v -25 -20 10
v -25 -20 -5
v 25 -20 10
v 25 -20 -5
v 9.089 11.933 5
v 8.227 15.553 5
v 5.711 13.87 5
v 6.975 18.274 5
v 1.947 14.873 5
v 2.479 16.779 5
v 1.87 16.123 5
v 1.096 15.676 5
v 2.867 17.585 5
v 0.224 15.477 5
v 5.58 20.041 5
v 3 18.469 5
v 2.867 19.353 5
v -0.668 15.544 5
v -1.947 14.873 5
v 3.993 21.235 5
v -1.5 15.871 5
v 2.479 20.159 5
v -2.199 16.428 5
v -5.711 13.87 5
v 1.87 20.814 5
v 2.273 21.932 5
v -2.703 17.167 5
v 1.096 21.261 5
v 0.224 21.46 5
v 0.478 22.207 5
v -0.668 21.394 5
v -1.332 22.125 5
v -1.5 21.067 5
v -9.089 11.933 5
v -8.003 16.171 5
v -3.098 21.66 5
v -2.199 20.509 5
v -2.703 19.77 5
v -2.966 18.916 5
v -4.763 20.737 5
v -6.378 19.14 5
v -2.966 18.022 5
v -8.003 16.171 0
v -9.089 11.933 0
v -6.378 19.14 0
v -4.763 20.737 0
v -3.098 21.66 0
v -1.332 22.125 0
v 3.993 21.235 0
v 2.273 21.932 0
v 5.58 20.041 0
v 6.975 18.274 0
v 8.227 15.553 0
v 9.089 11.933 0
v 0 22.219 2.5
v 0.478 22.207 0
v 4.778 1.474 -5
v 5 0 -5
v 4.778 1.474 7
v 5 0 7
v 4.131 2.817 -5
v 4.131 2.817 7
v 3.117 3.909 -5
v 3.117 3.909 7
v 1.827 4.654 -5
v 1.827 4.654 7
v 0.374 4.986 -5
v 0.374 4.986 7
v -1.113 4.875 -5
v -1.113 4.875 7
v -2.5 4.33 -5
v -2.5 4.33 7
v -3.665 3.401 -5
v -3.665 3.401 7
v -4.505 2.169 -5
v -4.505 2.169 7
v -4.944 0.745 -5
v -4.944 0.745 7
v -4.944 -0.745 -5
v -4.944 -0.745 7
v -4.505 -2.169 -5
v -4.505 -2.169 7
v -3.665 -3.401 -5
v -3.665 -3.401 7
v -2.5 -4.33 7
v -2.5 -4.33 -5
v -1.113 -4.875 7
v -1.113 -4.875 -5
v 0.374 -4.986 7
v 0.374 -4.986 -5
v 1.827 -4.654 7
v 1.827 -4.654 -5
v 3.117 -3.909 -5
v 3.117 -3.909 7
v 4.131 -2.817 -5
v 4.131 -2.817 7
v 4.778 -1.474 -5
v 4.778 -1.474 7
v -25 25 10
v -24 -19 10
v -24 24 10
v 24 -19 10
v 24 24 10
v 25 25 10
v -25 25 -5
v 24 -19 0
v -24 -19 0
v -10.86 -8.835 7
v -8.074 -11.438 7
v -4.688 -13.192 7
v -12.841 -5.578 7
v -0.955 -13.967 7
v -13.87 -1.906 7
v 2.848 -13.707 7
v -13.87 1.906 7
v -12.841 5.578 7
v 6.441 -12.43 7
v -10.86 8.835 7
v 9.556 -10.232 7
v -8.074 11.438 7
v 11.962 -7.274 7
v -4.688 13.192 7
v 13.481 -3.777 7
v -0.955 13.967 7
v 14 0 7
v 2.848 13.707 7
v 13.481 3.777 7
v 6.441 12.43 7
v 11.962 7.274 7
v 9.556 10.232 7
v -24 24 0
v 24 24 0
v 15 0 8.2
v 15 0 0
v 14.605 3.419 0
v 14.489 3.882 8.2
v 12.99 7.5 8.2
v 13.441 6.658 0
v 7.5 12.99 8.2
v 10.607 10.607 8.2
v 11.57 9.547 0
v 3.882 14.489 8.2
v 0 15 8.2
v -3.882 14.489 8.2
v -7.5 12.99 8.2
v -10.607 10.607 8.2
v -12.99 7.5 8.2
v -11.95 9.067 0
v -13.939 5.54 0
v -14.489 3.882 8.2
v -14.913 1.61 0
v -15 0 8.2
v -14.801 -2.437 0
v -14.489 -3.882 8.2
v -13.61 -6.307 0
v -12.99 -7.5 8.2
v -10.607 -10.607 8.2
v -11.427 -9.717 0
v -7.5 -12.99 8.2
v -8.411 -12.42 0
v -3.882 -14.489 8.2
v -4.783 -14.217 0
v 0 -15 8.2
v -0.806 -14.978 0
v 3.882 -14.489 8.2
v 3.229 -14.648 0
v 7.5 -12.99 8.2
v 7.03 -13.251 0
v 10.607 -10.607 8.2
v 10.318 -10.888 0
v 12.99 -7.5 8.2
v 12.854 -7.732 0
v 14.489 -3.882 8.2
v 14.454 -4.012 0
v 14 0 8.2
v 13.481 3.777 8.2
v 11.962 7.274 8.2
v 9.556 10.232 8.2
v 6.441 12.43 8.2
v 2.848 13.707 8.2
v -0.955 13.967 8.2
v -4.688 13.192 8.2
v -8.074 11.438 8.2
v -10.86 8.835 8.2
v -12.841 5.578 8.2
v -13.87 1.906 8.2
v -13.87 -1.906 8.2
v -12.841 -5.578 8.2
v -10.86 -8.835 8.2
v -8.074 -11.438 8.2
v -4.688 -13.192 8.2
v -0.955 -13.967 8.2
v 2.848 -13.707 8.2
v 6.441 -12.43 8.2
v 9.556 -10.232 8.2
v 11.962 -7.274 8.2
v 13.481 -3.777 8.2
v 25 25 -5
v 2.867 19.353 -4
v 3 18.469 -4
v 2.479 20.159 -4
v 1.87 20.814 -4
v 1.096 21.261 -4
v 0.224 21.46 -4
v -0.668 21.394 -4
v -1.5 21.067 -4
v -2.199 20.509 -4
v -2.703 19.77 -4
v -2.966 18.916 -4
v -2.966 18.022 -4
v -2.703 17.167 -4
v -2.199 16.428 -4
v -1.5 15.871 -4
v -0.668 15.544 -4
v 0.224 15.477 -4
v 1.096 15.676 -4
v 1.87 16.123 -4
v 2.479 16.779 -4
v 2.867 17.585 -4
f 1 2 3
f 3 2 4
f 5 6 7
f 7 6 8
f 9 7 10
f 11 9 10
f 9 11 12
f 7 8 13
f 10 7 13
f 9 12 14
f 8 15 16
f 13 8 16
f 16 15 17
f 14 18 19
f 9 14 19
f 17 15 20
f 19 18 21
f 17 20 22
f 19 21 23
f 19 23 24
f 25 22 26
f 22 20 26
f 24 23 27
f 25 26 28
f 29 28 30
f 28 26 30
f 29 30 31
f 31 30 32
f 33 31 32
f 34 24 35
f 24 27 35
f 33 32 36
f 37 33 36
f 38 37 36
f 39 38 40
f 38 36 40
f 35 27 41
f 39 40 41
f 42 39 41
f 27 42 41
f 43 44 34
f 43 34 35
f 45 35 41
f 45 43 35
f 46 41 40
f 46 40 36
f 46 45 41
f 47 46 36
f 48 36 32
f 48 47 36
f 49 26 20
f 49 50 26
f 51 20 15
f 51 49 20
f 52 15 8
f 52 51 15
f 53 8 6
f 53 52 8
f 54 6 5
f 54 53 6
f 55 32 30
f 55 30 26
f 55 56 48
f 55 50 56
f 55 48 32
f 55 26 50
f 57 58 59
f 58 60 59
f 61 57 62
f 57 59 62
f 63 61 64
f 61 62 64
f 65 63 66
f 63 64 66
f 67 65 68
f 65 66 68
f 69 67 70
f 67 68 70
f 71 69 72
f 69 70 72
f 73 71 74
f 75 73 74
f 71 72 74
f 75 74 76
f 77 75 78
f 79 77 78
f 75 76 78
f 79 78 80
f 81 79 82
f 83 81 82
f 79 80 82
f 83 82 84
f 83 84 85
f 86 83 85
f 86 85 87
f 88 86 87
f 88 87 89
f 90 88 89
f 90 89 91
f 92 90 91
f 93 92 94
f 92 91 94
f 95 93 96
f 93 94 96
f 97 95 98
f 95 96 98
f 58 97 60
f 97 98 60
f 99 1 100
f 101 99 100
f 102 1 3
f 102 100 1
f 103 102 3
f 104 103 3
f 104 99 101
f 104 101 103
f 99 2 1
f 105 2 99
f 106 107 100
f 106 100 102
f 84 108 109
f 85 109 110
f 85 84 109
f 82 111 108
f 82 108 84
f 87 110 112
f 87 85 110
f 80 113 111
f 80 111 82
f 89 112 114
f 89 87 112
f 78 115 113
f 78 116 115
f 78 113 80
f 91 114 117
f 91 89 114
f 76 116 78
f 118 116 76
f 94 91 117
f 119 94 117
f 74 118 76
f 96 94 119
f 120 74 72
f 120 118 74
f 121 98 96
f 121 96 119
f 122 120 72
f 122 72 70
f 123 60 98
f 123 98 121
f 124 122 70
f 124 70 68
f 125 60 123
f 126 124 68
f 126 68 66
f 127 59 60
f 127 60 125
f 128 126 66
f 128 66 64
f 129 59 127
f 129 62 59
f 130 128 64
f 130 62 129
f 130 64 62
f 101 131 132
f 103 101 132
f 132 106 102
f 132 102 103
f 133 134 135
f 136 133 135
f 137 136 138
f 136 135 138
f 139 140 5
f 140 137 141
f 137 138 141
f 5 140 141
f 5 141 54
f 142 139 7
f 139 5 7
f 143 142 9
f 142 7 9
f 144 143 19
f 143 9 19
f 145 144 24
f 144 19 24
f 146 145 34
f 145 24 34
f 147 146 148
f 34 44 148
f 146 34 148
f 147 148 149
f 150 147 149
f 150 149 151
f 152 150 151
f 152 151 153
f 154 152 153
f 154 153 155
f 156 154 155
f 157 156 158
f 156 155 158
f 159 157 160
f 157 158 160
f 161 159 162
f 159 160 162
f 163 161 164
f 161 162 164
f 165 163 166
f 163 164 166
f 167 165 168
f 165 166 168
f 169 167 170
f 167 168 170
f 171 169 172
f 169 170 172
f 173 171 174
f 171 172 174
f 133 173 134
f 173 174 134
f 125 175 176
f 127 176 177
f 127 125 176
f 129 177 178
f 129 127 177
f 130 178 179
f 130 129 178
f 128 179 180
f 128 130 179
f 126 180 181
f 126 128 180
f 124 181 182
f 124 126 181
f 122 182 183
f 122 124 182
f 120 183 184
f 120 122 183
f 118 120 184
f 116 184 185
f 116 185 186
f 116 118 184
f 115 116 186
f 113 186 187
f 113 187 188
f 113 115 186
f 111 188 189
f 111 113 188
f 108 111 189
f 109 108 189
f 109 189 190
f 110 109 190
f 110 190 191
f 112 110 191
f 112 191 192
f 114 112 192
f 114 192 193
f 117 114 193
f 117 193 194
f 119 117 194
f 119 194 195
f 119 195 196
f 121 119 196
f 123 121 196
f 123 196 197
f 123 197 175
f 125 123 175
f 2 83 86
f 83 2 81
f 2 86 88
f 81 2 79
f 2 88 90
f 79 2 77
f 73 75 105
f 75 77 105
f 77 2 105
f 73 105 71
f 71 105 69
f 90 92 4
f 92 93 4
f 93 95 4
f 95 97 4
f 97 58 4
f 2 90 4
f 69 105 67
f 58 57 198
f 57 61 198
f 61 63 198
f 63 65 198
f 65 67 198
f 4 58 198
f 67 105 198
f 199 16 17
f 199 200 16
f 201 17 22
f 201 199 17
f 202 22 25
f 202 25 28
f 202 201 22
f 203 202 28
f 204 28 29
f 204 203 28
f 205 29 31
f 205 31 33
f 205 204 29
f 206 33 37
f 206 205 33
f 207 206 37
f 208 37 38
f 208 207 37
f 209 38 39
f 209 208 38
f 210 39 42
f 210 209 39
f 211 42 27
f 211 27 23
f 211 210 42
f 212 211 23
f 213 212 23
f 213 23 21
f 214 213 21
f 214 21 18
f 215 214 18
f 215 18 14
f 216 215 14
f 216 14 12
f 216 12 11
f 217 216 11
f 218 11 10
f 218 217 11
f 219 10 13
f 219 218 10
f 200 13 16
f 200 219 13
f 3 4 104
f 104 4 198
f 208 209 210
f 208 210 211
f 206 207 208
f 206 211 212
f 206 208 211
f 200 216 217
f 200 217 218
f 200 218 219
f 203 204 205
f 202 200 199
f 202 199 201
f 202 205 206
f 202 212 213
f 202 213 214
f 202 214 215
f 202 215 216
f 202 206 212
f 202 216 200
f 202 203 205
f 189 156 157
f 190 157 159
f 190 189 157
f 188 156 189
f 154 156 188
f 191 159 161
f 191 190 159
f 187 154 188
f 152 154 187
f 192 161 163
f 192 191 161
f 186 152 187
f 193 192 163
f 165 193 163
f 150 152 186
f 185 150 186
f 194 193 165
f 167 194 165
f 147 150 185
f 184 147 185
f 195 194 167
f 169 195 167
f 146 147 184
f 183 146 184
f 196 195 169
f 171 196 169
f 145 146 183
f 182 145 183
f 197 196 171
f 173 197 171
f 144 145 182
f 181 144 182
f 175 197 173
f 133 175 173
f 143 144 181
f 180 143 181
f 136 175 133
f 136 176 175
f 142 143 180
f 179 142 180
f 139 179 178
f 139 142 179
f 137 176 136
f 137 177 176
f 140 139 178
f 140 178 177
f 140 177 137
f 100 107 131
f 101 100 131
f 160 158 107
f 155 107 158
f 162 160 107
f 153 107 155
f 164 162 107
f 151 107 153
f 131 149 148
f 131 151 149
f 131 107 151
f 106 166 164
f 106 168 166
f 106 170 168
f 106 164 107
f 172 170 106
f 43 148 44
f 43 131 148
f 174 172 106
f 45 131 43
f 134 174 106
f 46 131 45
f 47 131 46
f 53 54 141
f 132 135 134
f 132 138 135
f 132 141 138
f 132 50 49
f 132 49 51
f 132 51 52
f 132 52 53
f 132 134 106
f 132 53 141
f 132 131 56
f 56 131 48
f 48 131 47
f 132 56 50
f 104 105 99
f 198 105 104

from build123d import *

# Parameters (mm, degrees)
SKETCH_R          = 15
PAD_DEPTH         = 7
SKETCH001_R       = 3
PAD001_DEPTH      = 5
SKETCH002_R       = 15
SKETCH002_R_2     = 14
PAD002_DEPTH      = 8.2
SKETCH003_W       = 50
SKETCH003_H       = 45
PAD003_DEPTH      = 5
SKETCH004_W       = 50
SKETCH004_H       = 45
SKETCH004_W_2     = 48
SKETCH004_H_2     = 43
PAD004_DEPTH      = 10
SKETCH005_R       = 5
POCKET_DEPTH      = 5.001
POCKET_DEPTH_BACK = -10.001
SKETCH006_R       = 3
POCKET001_DEPTH   = 4


with BuildPart() as part:
    # Sketch → Pad (new body)
    with BuildSketch(Plane.XY):
        Circle(SKETCH_R)
    extrude(amount=PAD_DEPTH)

    # Sketch001 → Pad001 (join)
    with BuildSketch(Plane.XY):
        with BuildLine():
            add(Edge.make_bspline(
                [(-9.089263, 11.932531), (-7.840475, 19.926179), (0, 24.511142), (7.840475, 19.926179), (9.089263, 11.932531)],
                knots=[0, 0, 0, 0, 0.5, 1, 1, 1, 1], degree=3))
            Line((9.089263, 11.932531), (-9.089263, 11.932531))
        make_face()
        with Locations((0, 18.468813)):
            Circle(SKETCH001_R, mode=Mode.SUBTRACT)
    extrude(amount=PAD001_DEPTH)

    # Sketch002 → Pad002 (join)
    with BuildSketch(Plane.XY):
        Circle(SKETCH002_R)
        Circle(SKETCH002_R_2, mode=Mode.SUBTRACT)
    extrude(amount=PAD002_DEPTH)

    # Sketch003 → Pad003 (join)
    with BuildSketch(Plane.XY):
        with Locations((0, 2.5)):
            Rectangle(SKETCH003_W, SKETCH003_H)
    extrude(amount=-PAD003_DEPTH)

    # Sketch004 → Pad004 (join)
    with BuildSketch(Plane.XY):
        with Locations((0, 2.5)):
            Rectangle(SKETCH004_W, SKETCH004_H)
        with Locations((0, 2.5)):
            Rectangle(SKETCH004_W_2, SKETCH004_H_2, mode=Mode.SUBTRACT)
    extrude(amount=PAD004_DEPTH)

    # Sketch005 → Pocket (cut, two sides)
    with BuildSketch(Plane.XY) as pocket_sk:
        Circle(SKETCH005_R)
    extrude(amount=-POCKET_DEPTH, mode=Mode.SUBTRACT)
    extrude(pocket_sk.sketch, amount=-POCKET_DEPTH_BACK, mode=Mode.SUBTRACT)

    # Sketch006 → Pocket001 (cut)
    with BuildSketch(Plane.XY):
        with Locations((0, 18.468813)):
            Circle(SKETCH006_R)
    extrude(amount=-POCKET001_DEPTH, mode=Mode.SUBTRACT)


solid = part.part
